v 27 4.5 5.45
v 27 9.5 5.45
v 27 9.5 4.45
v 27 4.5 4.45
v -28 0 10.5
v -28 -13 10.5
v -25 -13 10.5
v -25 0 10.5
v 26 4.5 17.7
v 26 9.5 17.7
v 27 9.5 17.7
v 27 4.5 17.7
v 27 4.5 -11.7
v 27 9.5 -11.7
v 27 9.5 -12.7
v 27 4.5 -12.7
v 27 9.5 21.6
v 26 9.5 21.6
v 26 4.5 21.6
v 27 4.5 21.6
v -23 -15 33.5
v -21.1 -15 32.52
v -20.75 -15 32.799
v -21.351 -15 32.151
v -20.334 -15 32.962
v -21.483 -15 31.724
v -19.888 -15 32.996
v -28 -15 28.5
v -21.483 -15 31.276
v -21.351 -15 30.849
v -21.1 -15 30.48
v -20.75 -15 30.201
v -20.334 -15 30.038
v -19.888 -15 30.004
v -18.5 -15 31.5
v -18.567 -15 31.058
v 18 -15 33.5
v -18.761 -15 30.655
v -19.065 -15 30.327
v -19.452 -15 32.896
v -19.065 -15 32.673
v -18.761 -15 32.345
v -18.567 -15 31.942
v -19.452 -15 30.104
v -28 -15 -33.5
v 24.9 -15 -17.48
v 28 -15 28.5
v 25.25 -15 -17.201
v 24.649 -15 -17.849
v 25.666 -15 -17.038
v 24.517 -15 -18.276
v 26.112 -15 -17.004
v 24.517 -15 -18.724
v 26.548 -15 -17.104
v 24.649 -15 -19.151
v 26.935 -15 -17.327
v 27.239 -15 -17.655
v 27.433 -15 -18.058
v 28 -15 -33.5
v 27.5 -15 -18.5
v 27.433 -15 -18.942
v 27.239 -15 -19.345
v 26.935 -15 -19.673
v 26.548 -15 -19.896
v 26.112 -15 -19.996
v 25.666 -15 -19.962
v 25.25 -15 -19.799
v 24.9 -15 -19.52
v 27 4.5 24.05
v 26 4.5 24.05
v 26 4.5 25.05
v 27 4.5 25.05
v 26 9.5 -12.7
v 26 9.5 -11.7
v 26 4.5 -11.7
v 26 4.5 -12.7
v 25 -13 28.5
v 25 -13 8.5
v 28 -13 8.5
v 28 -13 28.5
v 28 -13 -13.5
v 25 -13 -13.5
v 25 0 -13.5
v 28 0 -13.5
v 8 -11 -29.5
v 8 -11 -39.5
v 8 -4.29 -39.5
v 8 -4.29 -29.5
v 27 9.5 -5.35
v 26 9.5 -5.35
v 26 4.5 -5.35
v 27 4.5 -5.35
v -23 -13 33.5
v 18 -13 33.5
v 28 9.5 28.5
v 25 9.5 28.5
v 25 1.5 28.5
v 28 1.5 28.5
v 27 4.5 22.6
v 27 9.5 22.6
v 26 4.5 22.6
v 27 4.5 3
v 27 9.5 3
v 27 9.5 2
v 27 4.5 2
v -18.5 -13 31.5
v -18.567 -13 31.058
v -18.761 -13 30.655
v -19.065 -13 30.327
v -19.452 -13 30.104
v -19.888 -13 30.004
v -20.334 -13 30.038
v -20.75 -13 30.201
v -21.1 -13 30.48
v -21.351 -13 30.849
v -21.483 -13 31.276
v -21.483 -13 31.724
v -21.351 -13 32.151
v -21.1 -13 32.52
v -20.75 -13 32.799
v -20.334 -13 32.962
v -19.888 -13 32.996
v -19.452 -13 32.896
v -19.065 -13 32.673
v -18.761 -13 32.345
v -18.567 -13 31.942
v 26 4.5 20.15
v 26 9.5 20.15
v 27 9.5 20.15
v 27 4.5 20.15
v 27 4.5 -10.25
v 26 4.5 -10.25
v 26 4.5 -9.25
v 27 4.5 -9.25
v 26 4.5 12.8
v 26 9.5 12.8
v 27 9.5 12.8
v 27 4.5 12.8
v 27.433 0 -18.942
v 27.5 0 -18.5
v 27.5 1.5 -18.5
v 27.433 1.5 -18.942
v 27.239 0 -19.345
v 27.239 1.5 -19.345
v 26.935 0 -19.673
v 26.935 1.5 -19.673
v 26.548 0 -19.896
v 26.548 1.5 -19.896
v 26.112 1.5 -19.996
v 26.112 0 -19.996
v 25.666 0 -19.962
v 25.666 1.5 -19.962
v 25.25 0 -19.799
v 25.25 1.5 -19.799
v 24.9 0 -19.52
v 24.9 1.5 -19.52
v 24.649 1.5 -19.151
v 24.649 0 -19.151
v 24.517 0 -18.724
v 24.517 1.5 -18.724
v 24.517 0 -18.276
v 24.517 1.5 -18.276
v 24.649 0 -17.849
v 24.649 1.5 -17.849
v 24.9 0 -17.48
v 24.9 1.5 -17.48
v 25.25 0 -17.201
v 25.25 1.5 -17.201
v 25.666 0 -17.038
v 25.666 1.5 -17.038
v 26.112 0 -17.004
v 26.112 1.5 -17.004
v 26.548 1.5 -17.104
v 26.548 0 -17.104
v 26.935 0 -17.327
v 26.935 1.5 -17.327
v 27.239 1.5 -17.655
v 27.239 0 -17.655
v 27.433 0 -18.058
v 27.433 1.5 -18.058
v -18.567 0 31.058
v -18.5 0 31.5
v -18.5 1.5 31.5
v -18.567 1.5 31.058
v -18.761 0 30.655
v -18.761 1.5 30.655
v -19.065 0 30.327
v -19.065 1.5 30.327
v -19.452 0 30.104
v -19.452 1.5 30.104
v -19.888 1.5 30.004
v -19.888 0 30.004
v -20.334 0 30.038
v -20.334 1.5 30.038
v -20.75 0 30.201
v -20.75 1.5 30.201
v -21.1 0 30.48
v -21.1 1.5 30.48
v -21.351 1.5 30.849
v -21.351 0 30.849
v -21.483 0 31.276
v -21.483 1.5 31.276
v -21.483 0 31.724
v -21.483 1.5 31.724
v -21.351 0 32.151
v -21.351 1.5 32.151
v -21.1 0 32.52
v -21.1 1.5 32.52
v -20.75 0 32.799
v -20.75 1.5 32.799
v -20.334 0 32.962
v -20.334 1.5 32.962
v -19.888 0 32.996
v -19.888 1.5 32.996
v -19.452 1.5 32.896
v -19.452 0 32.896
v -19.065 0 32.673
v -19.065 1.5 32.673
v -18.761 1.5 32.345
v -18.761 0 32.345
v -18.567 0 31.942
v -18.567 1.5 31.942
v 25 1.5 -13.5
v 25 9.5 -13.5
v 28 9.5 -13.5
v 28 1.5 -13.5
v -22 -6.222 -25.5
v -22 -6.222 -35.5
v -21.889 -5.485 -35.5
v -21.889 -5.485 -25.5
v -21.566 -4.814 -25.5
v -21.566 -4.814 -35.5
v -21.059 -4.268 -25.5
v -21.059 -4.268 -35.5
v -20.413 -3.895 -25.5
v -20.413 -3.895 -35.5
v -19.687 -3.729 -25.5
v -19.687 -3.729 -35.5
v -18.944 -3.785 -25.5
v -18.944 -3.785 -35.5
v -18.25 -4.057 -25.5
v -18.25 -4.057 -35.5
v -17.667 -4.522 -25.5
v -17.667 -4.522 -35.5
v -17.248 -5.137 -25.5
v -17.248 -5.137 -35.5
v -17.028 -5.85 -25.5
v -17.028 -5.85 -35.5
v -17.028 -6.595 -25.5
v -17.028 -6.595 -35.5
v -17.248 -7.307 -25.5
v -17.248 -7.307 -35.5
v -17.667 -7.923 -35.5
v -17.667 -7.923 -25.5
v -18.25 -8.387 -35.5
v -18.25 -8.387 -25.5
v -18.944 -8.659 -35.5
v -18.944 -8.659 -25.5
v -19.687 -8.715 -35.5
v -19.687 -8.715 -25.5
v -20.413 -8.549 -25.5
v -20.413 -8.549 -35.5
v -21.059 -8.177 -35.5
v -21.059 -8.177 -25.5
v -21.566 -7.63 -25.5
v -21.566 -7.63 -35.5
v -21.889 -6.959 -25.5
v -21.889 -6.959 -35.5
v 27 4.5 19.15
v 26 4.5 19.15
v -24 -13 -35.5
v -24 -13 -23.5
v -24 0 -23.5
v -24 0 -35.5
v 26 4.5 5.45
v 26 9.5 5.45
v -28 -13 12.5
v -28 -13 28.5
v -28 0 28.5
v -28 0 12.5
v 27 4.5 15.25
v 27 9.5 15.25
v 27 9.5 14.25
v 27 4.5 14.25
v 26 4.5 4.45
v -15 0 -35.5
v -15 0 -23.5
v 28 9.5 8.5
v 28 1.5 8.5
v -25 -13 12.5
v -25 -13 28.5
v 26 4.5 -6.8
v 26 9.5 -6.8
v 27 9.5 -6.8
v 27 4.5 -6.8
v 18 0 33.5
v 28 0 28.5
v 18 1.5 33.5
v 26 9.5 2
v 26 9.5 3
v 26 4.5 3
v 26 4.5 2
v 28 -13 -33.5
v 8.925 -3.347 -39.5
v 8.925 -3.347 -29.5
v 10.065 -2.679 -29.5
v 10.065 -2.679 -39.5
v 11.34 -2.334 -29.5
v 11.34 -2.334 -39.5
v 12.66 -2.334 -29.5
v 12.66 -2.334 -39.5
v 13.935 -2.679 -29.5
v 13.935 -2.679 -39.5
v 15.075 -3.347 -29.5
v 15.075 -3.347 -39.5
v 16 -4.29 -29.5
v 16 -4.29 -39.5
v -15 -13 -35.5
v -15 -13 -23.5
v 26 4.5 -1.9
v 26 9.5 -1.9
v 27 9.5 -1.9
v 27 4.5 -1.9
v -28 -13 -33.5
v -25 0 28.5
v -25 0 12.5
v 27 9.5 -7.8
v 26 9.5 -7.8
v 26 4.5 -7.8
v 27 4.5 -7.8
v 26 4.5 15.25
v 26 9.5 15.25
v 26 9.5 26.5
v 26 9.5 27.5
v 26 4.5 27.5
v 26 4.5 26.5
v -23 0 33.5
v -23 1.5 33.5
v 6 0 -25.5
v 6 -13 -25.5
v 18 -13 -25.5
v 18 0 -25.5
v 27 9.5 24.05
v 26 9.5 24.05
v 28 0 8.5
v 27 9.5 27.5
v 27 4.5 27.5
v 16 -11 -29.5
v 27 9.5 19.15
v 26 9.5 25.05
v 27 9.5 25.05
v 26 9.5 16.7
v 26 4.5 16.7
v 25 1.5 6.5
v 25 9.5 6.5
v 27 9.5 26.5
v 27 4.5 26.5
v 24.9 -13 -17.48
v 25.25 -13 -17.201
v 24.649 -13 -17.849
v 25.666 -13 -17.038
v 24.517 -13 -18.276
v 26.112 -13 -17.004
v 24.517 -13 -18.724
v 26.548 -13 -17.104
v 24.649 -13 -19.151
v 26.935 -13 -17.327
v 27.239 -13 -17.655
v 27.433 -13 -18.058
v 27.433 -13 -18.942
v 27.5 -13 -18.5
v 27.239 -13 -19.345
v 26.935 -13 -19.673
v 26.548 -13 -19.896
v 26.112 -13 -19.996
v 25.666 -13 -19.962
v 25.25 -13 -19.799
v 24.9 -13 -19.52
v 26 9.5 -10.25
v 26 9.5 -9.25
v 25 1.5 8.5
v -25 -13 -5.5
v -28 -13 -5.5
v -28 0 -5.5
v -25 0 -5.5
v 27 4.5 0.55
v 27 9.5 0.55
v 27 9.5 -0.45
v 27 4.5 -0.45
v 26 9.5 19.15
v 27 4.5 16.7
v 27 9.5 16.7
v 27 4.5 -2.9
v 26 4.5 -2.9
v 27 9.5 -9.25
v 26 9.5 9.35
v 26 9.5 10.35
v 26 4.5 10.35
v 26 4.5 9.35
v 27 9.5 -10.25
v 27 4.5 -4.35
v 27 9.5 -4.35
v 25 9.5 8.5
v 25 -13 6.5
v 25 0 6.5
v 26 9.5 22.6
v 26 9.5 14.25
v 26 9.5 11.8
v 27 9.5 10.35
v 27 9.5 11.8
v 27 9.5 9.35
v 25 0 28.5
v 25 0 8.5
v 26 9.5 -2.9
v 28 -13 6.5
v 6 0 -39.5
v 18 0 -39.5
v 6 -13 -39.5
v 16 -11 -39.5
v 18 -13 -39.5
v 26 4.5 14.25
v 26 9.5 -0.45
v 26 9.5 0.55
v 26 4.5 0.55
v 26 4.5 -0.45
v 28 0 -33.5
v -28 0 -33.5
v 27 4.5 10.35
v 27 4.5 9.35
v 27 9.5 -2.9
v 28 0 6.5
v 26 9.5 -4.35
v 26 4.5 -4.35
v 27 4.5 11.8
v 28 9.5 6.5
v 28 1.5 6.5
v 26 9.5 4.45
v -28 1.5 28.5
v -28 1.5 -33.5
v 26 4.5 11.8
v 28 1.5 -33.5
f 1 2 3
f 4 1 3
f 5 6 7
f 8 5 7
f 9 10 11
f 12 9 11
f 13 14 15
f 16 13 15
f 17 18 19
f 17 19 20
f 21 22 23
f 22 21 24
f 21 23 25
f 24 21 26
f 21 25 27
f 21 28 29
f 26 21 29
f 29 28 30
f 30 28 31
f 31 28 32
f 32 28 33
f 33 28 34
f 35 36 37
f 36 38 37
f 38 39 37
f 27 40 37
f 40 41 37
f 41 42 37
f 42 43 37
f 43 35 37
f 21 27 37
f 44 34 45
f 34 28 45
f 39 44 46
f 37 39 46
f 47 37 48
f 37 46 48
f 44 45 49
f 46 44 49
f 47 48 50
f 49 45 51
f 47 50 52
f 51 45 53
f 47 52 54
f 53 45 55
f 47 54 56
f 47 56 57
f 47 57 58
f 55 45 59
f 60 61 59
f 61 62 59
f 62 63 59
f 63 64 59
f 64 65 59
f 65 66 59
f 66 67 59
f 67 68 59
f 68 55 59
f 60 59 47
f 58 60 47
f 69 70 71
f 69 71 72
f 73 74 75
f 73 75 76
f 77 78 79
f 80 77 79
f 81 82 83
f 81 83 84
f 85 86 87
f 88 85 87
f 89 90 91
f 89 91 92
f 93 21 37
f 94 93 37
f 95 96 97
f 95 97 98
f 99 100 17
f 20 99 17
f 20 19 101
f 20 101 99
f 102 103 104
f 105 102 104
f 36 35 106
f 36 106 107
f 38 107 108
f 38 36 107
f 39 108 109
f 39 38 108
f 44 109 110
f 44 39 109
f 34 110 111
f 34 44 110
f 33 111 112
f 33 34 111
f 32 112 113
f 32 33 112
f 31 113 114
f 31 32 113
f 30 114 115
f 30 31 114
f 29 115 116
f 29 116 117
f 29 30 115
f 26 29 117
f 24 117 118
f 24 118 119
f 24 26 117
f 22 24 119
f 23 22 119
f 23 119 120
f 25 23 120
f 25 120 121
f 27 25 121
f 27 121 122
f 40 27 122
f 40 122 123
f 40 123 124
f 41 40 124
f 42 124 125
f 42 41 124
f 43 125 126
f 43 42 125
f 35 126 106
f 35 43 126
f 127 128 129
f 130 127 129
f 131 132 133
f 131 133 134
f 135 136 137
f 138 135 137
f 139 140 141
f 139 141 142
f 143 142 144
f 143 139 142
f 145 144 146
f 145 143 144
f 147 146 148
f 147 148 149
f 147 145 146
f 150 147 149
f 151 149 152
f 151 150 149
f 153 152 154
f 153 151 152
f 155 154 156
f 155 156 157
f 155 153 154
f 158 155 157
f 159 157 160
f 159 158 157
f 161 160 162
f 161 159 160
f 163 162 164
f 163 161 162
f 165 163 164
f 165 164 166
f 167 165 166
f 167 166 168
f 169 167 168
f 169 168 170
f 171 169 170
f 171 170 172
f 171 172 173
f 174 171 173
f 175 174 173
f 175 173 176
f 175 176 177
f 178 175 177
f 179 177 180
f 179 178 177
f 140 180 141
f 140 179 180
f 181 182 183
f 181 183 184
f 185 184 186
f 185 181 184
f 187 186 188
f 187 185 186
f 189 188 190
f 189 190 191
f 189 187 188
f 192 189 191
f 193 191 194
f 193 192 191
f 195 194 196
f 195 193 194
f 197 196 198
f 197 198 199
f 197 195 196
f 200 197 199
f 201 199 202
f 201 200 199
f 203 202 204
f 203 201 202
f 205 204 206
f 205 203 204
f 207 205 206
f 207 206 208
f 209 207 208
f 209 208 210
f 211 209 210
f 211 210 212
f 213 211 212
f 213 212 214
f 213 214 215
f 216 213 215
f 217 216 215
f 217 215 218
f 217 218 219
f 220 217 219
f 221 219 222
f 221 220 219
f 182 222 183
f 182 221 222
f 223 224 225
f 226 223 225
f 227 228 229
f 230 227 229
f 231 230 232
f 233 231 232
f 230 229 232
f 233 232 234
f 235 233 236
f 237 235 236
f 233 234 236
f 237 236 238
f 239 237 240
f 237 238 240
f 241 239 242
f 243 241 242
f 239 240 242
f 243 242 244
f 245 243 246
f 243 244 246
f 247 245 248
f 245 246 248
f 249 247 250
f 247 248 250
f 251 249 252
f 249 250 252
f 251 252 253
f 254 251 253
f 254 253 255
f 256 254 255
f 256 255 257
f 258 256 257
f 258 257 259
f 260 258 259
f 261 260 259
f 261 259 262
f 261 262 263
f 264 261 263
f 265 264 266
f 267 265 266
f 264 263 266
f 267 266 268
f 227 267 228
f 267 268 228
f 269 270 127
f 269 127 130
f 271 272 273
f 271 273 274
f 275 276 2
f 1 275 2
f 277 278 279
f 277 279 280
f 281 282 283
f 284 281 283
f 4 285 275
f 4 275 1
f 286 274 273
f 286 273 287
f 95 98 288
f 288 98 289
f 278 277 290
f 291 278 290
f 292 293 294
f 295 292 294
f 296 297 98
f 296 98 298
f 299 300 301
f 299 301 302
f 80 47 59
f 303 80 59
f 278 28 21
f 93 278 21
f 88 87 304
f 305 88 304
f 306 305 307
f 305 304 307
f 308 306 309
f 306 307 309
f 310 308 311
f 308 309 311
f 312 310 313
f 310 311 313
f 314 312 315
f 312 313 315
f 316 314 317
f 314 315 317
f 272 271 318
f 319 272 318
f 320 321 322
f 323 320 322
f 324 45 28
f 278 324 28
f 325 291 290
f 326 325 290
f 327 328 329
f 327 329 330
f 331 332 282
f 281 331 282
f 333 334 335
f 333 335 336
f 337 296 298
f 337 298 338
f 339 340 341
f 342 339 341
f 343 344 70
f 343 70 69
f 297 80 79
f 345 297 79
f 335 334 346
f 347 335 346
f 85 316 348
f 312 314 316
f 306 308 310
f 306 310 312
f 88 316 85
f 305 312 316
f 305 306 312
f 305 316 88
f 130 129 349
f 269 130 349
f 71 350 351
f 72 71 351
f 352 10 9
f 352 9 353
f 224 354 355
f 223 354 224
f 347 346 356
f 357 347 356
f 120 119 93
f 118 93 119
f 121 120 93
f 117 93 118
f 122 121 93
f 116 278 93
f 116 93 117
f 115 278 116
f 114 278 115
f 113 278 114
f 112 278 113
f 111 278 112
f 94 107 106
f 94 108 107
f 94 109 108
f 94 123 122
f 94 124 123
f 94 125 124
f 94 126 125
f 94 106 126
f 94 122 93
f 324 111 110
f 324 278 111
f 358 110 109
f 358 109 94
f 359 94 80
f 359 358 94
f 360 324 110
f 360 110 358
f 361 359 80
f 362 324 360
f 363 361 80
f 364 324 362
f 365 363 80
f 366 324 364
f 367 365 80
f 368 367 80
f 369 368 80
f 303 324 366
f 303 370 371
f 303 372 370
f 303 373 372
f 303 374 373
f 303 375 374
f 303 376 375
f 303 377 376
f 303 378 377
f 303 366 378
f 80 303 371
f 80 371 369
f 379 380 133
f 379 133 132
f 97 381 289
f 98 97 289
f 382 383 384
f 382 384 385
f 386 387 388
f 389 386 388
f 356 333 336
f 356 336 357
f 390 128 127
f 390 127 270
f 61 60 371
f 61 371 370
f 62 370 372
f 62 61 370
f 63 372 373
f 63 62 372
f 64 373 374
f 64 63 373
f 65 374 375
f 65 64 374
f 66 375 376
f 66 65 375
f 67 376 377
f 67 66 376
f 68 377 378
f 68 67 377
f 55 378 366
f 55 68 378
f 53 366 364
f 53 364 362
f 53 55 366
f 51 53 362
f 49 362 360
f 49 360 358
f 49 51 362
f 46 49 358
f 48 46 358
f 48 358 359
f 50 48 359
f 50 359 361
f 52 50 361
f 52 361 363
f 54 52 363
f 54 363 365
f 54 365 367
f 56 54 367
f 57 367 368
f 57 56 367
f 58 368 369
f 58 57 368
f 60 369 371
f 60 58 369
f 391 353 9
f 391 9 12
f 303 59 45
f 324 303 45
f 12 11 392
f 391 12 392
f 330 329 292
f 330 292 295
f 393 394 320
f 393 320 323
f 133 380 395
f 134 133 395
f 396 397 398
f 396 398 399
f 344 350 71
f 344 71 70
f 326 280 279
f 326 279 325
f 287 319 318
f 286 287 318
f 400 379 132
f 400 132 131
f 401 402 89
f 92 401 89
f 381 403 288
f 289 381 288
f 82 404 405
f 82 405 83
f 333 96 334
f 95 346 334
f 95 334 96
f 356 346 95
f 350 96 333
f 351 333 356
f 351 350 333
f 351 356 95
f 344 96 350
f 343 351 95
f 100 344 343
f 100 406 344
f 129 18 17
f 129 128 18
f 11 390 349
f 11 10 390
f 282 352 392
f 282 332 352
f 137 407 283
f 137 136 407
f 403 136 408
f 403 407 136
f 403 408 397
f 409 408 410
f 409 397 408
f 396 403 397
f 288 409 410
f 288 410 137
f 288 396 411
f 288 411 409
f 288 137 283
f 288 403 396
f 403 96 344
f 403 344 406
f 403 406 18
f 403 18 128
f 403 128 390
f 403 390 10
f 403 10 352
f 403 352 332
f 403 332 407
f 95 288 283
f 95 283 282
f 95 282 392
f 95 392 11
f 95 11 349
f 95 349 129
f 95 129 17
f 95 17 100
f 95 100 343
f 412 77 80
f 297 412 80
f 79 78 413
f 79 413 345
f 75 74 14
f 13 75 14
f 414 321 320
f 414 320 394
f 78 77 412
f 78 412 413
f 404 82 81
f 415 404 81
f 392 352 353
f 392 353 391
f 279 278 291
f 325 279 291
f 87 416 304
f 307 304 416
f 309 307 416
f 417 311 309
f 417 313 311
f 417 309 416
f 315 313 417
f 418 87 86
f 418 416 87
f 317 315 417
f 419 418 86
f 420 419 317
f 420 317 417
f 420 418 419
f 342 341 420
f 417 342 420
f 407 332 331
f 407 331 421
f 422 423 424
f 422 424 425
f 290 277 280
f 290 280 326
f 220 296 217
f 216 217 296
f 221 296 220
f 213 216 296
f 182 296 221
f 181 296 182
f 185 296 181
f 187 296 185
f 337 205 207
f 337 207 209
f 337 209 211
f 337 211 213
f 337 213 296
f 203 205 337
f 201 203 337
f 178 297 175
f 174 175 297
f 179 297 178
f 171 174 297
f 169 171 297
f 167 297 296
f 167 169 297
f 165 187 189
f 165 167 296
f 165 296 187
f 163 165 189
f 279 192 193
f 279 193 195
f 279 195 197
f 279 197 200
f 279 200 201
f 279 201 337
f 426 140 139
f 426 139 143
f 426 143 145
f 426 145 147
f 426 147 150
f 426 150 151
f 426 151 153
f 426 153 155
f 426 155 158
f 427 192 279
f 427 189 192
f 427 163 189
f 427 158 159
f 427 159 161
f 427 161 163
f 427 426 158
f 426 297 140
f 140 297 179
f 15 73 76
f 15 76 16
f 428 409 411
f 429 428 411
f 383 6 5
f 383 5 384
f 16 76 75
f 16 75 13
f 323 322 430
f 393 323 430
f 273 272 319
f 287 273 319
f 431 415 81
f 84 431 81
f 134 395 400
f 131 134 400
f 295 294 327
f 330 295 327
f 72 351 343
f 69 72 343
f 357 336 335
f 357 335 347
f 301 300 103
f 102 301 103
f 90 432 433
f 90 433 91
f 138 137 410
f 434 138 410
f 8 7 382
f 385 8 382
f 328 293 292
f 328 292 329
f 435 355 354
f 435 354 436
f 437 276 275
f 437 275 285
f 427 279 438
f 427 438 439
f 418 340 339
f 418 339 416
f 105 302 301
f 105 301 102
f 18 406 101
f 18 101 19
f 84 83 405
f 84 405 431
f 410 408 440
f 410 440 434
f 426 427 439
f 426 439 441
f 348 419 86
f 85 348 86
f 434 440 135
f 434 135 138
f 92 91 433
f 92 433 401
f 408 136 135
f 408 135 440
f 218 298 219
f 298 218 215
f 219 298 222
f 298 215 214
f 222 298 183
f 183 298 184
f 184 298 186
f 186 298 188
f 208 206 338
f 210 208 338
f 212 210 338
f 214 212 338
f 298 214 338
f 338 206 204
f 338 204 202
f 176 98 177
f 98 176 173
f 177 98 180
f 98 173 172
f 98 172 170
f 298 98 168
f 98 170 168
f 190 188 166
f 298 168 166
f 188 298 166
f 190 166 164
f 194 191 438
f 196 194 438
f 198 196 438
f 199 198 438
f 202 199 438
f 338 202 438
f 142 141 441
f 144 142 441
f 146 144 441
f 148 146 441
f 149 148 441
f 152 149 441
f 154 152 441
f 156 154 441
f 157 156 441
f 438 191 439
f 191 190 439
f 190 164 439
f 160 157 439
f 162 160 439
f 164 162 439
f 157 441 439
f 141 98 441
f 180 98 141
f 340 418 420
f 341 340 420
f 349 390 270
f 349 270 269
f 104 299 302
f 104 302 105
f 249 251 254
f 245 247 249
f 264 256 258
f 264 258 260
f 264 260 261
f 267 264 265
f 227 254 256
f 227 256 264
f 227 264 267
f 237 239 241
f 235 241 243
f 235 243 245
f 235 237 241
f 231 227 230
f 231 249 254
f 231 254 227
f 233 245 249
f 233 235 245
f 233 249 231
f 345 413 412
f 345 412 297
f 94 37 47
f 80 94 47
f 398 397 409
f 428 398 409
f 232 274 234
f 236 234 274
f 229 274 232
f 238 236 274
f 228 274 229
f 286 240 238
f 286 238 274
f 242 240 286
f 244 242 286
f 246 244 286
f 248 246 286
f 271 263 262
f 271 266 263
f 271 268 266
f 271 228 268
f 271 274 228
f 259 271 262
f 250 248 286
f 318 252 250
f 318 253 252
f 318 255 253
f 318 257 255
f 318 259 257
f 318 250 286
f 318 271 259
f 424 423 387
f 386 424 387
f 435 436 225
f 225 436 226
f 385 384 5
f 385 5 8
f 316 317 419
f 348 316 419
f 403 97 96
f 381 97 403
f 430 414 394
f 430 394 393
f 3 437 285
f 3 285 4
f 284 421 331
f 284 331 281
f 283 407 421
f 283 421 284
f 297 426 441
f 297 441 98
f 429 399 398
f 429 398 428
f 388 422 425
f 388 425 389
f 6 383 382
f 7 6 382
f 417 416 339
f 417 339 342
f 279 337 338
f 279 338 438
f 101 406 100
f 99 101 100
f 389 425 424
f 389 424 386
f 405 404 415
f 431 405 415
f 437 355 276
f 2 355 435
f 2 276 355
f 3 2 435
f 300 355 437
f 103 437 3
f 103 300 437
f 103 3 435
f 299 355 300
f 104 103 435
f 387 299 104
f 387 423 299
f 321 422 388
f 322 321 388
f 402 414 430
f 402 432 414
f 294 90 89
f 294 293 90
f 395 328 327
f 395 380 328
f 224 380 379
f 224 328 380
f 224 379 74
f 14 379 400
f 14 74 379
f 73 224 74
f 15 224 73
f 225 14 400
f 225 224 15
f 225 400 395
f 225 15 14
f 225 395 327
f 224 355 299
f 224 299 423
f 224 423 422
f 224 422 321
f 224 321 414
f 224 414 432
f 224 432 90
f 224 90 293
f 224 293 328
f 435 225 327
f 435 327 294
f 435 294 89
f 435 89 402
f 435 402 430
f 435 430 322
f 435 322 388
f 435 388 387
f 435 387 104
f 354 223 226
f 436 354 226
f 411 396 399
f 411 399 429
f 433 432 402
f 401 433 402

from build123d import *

# Parameters (mm, degrees)
SKETCH_1_R          = 1.5
EXTRUDE_1_DEPTH     = 1.5
SKETCH_2_R          = 1.5
EXTRUDE_2_DEPTH     = 2
SKETCH_3_W          = 3
SKETCH_3_H          = 20
EXTRUDE_4_DEPTH     = 13
EXTRUDE_4_2_DEPTH   = 13
SKETCH_4_W          = 3
SKETCH_4_H          = 20
EXTRUDE_6_DEPTH     = 8
EXTRUDE_6_2_DEPTH   = 8
SKETCH_5_W          = 1
SKETCH_5_H          = 1
CUT_EXTRUDE_1_DEPTH = 5
SKETCH_6_W          = 3
SKETCH_6_H          = 16
EXTRUDE_7_DEPTH     = 13
EXTRUDE_7_2_DEPTH   = 13
SKETCH_7_W          = 12
SKETCH_7_H          = 14
EXTRUDE_8_DEPTH     = 13
CUT_EXTRUDE_2_DEPTH = 10
SKETCH_9_W          = 9
SKETCH_9_H          = 12
EXTRUDE_9_DEPTH     = 13
SKETCH_10_R         = 2.5
CUT_EXTRUDE_3_DEPTH = 10


with BuildPart() as part:
    # Эскиз1 → Бобышка-Вытянуть1 (new body)
    with BuildSketch(Plane(origin=(0, 0, 0), x_dir=(1, 0, 0), z_dir=(0, 1, 0))):
        Polygon((-28, 33.5), (28, 33.5), (28, -28.5), (18, -33.5), (-23, -33.5), (-28, -28.5), align=None)
        with Locations((-20, -31.5)):
            Circle(SKETCH_1_R, mode=Mode.SUBTRACT)
        with Locations((26, 18.5)):
            Circle(SKETCH_1_R, mode=Mode.SUBTRACT)
    extrude(amount=EXTRUDE_1_DEPTH)


with BuildPart() as body_2:
    # Эскиз2 → Бобышка-Вытянуть2 (new body)
    with BuildSketch(Plane(origin=(0, -15, 0), x_dir=(1, 0, 0), z_dir=(0, 1, 0))):
        Polygon((28, 33.5), (-28, 33.5), (-28, -28.5), (-23, -33.5), (18, -33.5), (28, -28.5), align=None)
        with Locations((26, 18.5)):
            Circle(SKETCH_2_R, mode=Mode.SUBTRACT)
        with Locations((-20, -31.5)):
            Circle(SKETCH_2_R, mode=Mode.SUBTRACT)
    extrude(amount=EXTRUDE_2_DEPTH)


with BuildPart() as body_3:
    # Эскиз3 → Бобышка-Вытянуть4 (new body)
    with BuildSketch(Plane(origin=(0, -13, 0), x_dir=(1, 0, 0), z_dir=(0, 1, 0))):
        with Locations((26.5, 3.5)):
            Rectangle(SKETCH_3_W, SKETCH_3_H)
    extrude(amount=EXTRUDE_4_DEPTH)


with BuildPart() as body_4:
    # Эскиз3 → Extrude 4 2 (new body)
    with BuildSketch(Plane(origin=(0, -13, 0), x_dir=(1, 0, 0), z_dir=(0, 1, 0))):
        with Locations((26.5, -18.5)):
            Rectangle(SKETCH_3_W, SKETCH_3_H)
    extrude(amount=EXTRUDE_4_2_DEPTH)


with BuildPart() as body_5:
    # Эскиз4 → Бобышка-Вытянуть6 (new body)
    with BuildSketch(Plane(origin=(0, 1.5, 0), x_dir=(1, 0, 0), z_dir=(0, 1, 0))):
        with Locations((26.5, -18.5)):
            Rectangle(SKETCH_4_W, SKETCH_4_H)
    extrude(amount=EXTRUDE_6_DEPTH)


with BuildPart() as body_6:
    # Эскиз4 → Extrude 6 2 (new body)
    with BuildSketch(Plane(origin=(0, 1.5, 0), x_dir=(1, 0, 0), z_dir=(0, 1, 0))):
        with Locations((26.5, 3.5)):
            Rectangle(SKETCH_4_W, SKETCH_4_H)
    extrude(amount=EXTRUDE_6_2_DEPTH)


with BuildPart() as cut_extrude_1_tool:
    # Эскиз5 → Вырез-Вытянуть1 (new body)
    with BuildSketch(Plane(origin=(0, 9.5, 0), x_dir=(1, 0, 0), z_dir=(0, 1, 0))):
        with Locations((26.5, -27)):
            Rectangle(SKETCH_5_W, SKETCH_5_H)
        with Locations((26.5, -24.55)):
            Rectangle(SKETCH_5_W, SKETCH_5_H)
        with Locations((26.5, -22.1)):
            Rectangle(SKETCH_5_W, SKETCH_5_H)
        with Locations((26.5, -19.65)):
            Rectangle(SKETCH_5_W, SKETCH_5_H)
        with Locations((26.5, -17.2)):
            Rectangle(SKETCH_5_W, SKETCH_5_H)
        with Locations((26.5, -14.75)):
            Rectangle(SKETCH_5_W, SKETCH_5_H)
        with Locations((26.5, -12.3)):
            Rectangle(SKETCH_5_W, SKETCH_5_H)
        with Locations((26.5, -9.85)):
            Rectangle(SKETCH_5_W, SKETCH_5_H)
        with Locations((26.5, -4.95)):
            Rectangle(SKETCH_5_W, SKETCH_5_H)
        with Locations((26.5, -2.5)):
            Rectangle(SKETCH_5_W, SKETCH_5_H)
        with Locations((26.5, -0.05)):
            Rectangle(SKETCH_5_W, SKETCH_5_H)
        with Locations((26.5, 2.4)):
            Rectangle(SKETCH_5_W, SKETCH_5_H)
        with Locations((26.5, 4.85)):
            Rectangle(SKETCH_5_W, SKETCH_5_H)
        with Locations((26.5, 7.3)):
            Rectangle(SKETCH_5_W, SKETCH_5_H)
        with Locations((26.5, 9.75)):
            Rectangle(SKETCH_5_W, SKETCH_5_H)
        with Locations((26.5, 12.2)):
            Rectangle(SKETCH_5_W, SKETCH_5_H)
    extrude(amount=-CUT_EXTRUDE_1_DEPTH)


with BuildPart() as body_5_1:
    add(body_5.part)

    # Вырез-Вытянуть1: cut by cut_extrude_1_tool
    add(cut_extrude_1_tool.part, mode=Mode.SUBTRACT)


with BuildPart() as body_6_1:
    add(body_6.part)

    # Вырез-Вытянуть1: cut by cut_extrude_1_tool
    add(cut_extrude_1_tool.part, mode=Mode.SUBTRACT)


with BuildPart() as body_7:
    # Эскиз6 → Бобышка-Вытянуть7 (new body)
    with BuildSketch(Plane(origin=(0, -13, 0), x_dir=(1, 0, 0), z_dir=(0, 1, 0))):
        with Locations((-26.5, -2.5)):
            Rectangle(SKETCH_6_W, SKETCH_6_H)
    extrude(amount=EXTRUDE_7_DEPTH)


with BuildPart() as body_8:
    # Эскиз6 → Extrude 7 2 (new body)
    with BuildSketch(Plane(origin=(0, -13, 0), x_dir=(1, 0, 0), z_dir=(0, 1, 0))):
        with Locations((-26.5, -20.5)):
            Rectangle(SKETCH_6_W, SKETCH_6_H)
    extrude(amount=EXTRUDE_7_2_DEPTH)


with BuildPart() as body_9:
    # Эскиз7 → Бобышка-Вытянуть8 (new body)
    with BuildSketch(Plane(origin=(0, -13, 0), x_dir=(1, 0, 0), z_dir=(0, 1, 0))):
        with Locations((12, 32.5)):
            Rectangle(SKETCH_7_W, SKETCH_7_H)
    extrude(amount=EXTRUDE_8_DEPTH)

    # Эскиз8 → Вырез-Вытянуть2 (cut)
    with BuildSketch(Plane(origin=(0, 0, -39.5), x_dir=(-1, 0, 0), z_dir=(0, 0, -1))):
        with BuildLine():
            Line((-16, -11), (-8, -11))
            Line((-8, -11), (-8, -4.289726372))
            ThreePointArc((-8, -4.289726372), (-12, -2.289726372), (-16, -4.289726372))
            Line((-16, -4.289726372), (-16, -11))
        make_face()
    extrude(amount=-CUT_EXTRUDE_2_DEPTH, mode=Mode.SUBTRACT)


with BuildPart() as body_10:
    # Эскиз9 → Бобышка-Вытянуть9 (new body)
    with BuildSketch(Plane(origin=(0, -13, 0), x_dir=(1, 0, 0), z_dir=(0, 1, 0))):
        with Locations((-19.5, 29.5)):
            Rectangle(SKETCH_9_W, SKETCH_9_H)
    extrude(amount=EXTRUDE_9_DEPTH)

    # Эскиз10 → Вырез-Вытянуть3 (cut)
    with BuildSketch(Plane(origin=(0, 0, -35.5), x_dir=(-1, 0, 0), z_dir=(0, 0, -1))):
        with Locations((19.5, -6.222141273)):
            Circle(SKETCH_10_R)
    extrude(amount=-CUT_EXTRUDE_3_DEPTH, mode=Mode.SUBTRACT)


solid = Compound([part.part, body_2.part, body_3.part, body_4.part, body_5_1.part, body_6_1.part, body_7.part, body_8.part, body_9.part, body_10.part])
